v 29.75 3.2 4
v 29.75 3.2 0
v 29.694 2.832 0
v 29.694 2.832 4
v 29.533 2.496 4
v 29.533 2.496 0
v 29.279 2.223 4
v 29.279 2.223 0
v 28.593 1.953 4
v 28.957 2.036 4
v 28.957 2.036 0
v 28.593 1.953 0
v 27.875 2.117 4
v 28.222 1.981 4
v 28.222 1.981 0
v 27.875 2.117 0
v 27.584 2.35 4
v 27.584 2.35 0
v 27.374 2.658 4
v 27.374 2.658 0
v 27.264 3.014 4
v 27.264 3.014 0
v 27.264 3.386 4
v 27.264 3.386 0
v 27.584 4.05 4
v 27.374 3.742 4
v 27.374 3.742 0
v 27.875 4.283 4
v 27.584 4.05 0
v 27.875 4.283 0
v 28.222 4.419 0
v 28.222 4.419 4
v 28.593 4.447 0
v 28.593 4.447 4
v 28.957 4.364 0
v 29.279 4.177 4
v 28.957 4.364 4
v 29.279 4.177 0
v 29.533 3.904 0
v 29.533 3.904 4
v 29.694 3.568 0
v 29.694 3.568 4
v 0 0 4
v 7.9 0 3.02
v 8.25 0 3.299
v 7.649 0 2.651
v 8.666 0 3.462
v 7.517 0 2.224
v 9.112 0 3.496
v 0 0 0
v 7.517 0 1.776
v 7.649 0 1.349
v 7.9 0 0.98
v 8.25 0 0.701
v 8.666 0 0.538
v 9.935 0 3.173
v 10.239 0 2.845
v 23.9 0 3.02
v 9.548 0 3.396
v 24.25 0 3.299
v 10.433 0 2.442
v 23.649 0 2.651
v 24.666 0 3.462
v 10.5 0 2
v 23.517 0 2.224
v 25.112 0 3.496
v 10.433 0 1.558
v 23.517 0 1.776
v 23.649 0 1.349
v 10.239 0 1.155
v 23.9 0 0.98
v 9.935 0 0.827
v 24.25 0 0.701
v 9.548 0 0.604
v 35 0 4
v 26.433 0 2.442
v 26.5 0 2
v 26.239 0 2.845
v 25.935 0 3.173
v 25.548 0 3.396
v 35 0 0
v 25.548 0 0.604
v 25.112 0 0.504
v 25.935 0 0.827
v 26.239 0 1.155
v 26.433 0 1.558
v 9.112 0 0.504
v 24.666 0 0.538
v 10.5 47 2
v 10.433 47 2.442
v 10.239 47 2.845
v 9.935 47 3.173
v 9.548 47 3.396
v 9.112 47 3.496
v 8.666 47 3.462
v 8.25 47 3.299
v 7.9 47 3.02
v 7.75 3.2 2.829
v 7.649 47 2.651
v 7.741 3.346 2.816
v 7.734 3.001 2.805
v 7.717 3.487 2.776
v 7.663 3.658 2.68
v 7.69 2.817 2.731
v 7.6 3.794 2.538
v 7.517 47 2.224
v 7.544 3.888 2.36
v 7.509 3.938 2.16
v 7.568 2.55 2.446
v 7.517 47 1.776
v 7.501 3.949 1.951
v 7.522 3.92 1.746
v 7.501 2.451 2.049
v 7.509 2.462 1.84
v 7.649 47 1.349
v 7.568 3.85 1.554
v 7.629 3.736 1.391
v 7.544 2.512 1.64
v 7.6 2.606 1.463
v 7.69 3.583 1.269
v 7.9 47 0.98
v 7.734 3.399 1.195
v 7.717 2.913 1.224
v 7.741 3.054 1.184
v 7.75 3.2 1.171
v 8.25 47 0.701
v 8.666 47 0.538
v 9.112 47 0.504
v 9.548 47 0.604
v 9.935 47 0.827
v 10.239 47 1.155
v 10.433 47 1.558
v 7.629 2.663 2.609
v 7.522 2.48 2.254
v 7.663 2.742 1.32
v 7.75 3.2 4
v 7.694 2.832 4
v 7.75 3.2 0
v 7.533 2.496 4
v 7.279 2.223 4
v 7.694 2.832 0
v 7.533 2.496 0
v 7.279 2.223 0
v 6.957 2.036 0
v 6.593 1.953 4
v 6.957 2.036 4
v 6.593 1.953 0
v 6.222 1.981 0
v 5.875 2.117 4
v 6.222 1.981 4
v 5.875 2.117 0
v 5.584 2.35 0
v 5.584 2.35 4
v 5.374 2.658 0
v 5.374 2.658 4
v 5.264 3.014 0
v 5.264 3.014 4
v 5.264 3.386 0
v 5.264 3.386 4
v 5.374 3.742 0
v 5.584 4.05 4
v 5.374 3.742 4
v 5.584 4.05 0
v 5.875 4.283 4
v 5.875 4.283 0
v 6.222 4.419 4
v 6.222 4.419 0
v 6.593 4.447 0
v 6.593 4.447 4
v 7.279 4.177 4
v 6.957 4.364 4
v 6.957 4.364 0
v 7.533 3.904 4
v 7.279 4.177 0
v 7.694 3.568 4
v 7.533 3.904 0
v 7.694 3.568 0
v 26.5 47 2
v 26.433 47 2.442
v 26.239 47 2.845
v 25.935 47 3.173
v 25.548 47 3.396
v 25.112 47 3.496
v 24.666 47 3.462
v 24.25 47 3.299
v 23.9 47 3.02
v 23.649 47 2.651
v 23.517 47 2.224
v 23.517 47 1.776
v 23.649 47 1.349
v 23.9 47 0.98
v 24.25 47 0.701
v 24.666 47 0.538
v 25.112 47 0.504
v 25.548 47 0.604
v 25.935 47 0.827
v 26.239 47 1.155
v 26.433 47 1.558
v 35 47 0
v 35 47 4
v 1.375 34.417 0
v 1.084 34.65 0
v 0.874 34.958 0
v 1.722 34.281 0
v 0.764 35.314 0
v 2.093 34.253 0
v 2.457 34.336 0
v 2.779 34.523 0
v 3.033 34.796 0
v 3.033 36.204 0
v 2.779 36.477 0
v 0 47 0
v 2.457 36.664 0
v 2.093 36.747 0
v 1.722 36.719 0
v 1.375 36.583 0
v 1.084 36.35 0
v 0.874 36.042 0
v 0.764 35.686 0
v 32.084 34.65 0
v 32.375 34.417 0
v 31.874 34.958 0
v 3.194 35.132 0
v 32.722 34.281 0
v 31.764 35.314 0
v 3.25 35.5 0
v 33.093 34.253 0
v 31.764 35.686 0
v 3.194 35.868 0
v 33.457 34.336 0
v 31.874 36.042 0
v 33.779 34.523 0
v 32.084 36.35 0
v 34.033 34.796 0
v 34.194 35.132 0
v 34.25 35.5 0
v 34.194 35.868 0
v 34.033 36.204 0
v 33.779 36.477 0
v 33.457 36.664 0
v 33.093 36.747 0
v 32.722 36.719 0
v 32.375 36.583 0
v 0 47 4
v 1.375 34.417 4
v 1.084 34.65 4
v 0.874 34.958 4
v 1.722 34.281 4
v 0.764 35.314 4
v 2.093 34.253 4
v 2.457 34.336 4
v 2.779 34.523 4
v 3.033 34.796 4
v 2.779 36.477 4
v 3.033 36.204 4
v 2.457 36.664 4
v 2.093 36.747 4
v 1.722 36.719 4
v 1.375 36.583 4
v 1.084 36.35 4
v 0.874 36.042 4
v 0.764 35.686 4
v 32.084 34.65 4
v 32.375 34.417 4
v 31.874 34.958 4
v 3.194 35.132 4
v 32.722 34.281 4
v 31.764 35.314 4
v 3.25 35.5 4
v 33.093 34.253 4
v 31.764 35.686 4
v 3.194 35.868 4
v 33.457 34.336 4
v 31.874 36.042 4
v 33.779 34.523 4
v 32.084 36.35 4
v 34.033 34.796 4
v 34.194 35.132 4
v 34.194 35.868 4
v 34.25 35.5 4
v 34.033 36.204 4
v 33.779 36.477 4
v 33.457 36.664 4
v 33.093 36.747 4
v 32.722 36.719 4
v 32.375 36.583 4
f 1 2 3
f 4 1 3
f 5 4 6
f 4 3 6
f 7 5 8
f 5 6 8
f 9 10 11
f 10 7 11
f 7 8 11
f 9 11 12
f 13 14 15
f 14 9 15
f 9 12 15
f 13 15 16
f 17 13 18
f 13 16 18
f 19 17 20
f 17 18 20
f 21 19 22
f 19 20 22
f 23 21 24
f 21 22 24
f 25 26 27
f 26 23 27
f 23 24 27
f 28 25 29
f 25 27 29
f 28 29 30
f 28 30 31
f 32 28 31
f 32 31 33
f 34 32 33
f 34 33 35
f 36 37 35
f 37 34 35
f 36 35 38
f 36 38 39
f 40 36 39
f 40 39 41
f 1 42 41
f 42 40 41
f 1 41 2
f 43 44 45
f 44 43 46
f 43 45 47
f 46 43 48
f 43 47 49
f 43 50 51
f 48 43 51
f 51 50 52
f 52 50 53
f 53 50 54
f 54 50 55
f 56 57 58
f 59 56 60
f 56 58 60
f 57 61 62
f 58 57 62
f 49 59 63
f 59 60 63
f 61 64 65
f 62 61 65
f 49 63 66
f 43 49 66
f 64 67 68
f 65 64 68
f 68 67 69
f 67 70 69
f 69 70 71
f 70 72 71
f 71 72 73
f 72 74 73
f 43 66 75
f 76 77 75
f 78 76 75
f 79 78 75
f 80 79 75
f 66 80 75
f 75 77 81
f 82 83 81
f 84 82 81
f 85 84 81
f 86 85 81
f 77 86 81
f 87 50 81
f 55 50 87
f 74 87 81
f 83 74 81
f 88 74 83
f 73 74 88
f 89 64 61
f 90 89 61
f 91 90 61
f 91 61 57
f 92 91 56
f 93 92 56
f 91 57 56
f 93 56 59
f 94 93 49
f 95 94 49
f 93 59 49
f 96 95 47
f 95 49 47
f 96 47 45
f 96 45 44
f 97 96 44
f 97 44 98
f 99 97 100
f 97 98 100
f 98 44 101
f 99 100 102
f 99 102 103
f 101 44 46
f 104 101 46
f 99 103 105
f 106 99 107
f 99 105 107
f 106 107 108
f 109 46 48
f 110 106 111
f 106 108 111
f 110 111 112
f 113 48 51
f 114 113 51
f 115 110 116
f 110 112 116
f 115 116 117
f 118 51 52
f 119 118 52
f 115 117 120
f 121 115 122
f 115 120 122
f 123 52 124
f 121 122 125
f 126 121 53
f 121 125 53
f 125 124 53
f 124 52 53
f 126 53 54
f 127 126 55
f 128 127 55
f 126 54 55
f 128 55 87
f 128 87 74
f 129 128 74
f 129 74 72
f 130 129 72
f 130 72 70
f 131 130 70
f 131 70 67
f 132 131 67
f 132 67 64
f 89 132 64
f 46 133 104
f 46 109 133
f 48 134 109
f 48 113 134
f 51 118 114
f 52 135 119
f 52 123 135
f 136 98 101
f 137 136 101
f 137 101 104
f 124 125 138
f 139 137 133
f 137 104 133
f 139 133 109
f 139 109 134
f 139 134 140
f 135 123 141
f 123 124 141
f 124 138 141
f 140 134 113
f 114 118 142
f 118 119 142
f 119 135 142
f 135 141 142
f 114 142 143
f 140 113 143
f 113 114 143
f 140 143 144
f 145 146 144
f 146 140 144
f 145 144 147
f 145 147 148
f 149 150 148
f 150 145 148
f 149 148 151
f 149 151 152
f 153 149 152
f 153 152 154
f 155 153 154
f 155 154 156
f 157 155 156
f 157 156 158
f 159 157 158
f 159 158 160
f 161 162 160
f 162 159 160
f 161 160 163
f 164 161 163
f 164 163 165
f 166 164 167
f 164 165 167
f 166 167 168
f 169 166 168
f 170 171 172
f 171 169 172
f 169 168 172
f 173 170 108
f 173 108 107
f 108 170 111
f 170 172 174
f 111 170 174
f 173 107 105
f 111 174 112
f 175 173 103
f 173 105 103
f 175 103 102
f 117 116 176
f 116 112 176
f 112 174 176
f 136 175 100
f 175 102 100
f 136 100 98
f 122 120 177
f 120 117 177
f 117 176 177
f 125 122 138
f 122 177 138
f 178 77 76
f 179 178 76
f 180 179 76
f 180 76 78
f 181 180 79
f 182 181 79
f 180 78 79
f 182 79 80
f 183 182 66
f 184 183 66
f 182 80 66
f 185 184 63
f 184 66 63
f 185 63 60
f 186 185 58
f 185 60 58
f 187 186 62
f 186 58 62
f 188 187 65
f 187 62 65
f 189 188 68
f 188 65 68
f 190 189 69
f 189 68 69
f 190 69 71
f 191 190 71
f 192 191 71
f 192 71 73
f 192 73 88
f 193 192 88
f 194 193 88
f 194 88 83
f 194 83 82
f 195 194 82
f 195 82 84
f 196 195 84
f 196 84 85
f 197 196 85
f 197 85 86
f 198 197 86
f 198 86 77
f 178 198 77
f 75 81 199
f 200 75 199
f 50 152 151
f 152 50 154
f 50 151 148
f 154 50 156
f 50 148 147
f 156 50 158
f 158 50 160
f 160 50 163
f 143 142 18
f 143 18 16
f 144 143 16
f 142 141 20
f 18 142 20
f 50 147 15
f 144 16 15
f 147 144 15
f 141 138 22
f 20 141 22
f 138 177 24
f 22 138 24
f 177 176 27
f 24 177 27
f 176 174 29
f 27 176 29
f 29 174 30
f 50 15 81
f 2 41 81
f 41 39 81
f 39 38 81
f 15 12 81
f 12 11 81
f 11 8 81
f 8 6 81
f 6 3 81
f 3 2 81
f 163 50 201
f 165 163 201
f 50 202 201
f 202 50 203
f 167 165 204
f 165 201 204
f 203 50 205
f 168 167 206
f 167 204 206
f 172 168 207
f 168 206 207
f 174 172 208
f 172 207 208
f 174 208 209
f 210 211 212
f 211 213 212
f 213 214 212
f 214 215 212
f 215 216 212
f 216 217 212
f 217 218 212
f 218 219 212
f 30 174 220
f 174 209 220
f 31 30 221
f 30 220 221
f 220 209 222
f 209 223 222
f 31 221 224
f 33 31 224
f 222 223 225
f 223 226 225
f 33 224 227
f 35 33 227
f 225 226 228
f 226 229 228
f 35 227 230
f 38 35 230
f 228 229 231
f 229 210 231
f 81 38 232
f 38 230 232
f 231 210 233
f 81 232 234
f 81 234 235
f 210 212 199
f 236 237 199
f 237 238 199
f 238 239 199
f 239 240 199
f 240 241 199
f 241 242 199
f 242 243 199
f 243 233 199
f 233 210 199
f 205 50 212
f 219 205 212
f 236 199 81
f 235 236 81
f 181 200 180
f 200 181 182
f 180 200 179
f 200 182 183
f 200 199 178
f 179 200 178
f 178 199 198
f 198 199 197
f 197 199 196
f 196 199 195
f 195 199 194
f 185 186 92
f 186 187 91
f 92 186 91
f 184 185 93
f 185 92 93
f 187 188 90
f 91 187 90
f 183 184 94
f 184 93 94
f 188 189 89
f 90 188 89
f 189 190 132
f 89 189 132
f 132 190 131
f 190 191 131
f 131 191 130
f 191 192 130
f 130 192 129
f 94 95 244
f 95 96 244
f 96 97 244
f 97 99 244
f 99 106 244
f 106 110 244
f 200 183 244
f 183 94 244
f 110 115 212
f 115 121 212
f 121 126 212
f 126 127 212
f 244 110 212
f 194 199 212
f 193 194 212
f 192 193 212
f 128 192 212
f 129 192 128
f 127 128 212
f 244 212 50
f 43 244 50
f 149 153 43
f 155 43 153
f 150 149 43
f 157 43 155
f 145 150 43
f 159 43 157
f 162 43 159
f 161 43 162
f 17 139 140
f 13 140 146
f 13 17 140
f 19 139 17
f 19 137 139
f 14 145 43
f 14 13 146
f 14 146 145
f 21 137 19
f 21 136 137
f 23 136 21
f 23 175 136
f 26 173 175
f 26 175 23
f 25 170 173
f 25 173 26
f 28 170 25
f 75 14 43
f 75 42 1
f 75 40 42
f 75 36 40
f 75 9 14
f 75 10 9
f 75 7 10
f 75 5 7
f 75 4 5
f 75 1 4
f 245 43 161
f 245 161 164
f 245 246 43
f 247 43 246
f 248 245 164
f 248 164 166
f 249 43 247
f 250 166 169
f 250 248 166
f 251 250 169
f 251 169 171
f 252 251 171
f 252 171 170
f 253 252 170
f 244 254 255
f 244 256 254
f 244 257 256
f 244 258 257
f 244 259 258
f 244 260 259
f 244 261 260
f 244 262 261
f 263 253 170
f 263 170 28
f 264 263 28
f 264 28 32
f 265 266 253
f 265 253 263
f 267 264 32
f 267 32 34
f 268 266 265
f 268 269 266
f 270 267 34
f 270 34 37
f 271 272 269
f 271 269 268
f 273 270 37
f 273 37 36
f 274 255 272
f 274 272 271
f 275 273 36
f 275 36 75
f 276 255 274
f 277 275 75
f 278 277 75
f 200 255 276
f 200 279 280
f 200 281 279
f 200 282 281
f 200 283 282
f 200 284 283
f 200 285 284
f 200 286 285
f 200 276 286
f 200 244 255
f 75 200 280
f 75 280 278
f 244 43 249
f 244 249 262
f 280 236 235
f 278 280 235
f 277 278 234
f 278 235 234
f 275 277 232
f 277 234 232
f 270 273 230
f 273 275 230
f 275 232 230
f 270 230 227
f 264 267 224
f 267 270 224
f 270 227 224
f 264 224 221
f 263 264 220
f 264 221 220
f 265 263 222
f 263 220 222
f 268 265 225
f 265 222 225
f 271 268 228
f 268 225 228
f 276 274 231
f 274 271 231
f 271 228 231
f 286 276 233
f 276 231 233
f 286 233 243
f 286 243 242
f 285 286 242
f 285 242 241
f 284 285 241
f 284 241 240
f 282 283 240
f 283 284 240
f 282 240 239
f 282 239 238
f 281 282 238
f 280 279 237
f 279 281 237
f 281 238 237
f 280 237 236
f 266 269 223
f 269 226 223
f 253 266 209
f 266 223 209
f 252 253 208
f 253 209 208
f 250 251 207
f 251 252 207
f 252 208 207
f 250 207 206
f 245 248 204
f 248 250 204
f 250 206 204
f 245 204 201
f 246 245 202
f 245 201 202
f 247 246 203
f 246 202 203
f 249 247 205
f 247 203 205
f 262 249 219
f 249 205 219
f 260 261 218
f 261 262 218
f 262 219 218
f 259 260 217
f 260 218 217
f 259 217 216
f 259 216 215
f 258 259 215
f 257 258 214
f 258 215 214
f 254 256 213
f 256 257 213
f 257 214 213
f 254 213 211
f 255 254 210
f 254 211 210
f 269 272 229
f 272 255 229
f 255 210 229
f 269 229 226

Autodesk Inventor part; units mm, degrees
ref_plane "YZ Plane" through (0, 0, 0) normal (1, 0, 0) x (0, 1, 0)
ref_plane "XZ Plane" through (0, 0, 0) normal (0, 1, 0) x (-1, 0, 0)
ref_plane "XY Plane" through (0, 0, 0) normal (0, 0, 1) x (1, 0, 0)
sketch "Sketch12" plane through (0, 0, 0) normal (0, 0, 1) x (1, 0, 0)
  line L0 (0, 0) -> (35, 0)
  line L1 (35, 0) -> (35, 47)
  line L2 (35, 47) -> (0, 47)
  line L3 (0, 47) -> (0, 0)
  line L4 (0, 47) -> (2, 47) construction
  line L5 (2, 47) -> (2, 35.5) construction
  line L6 (35, 47) -> (33, 47) construction
  line L7 (33, 47) -> (33, 35.5) construction
  circle A0 centre (33, 35.5) radius 1.25
  circle A1 centre (2, 35.5) radius 1.25
  line L8 (0, 0) -> (6.5, 0) construction
  line L9 (35, 0) -> (28.5, 0) construction
  line L10 (6.5, 0) -> (6.5, 3.2) construction
  line L11 (28.5, 0) -> (28.5, 3.2) construction
  circle A2 centre (6.5, 3.2) radius 1.25
  circle A3 centre (28.5, 3.2) radius 1.25
  dimension "d49" = 35
  dimension "d50" = 47
  dimension "d97" = 2
  dimension "d98" = 11.5
  dimension "d99" = 2
  dimension "d100" = 2.5
  dimension "d101" = 2.5
  dimension "d102" = 11.5
  dimension "d103" = 6.5
  dimension "d104" = 6.5
  dimension "d105" = 3.2
  dimension "d106" = 3.2
  dimension "d107" = 2.5
  dimension "d108" = 2.5
extrude "Extrusión8" add sketch "Sketch12" along normal blind 4
sketch "Boceto21" plane through (0, 0, 0) normal (0, -1, 0) x (1, 0, 0)
  line L0 (35, 0) -> (35, 4) construction
  line L1 (35, 0) -> (35, 4) construction
  line L2 (0, 0) -> (0, 4) construction
  line L3 (0, 0) -> (0, 4) construction
  line L4 (0, 2) -> (35, 2) construction
  line L5 (35, 2) -> (25, 2) construction
  line L6 (0, 2) -> (9, 2) construction
  circle A0 centre (9, 2) radius 1.5
  circle A1 centre (25, 2) radius 1.5
  dimension "d111" = 10
  dimension "d112" = 9
  dimension "d113" = 3
  dimension "d114" = 3
extrude "Extrusión9" cut sketch "Boceto21" along normal through all both and the other way through all
equation "\"BendRadius\" = Thickness"
equation "\"BendReliefWidth\" = Thickness"
equation "\"BendReliefDepth\" = 0.5 * Thickness"
equation "\"CornerReliefSize\" = 4 * Thickness"
equation "\"MinimumRemnant\" = 2 * Thickness"
equation "\"TransitionRadius\" = BendRadius"
equation "\"JacobiRadiusSize\" = BendRadius"
equation "\"GapSize\" = Thickness"
equation "\"Thickness\" = 1"
properties part number "Suportmotor"
